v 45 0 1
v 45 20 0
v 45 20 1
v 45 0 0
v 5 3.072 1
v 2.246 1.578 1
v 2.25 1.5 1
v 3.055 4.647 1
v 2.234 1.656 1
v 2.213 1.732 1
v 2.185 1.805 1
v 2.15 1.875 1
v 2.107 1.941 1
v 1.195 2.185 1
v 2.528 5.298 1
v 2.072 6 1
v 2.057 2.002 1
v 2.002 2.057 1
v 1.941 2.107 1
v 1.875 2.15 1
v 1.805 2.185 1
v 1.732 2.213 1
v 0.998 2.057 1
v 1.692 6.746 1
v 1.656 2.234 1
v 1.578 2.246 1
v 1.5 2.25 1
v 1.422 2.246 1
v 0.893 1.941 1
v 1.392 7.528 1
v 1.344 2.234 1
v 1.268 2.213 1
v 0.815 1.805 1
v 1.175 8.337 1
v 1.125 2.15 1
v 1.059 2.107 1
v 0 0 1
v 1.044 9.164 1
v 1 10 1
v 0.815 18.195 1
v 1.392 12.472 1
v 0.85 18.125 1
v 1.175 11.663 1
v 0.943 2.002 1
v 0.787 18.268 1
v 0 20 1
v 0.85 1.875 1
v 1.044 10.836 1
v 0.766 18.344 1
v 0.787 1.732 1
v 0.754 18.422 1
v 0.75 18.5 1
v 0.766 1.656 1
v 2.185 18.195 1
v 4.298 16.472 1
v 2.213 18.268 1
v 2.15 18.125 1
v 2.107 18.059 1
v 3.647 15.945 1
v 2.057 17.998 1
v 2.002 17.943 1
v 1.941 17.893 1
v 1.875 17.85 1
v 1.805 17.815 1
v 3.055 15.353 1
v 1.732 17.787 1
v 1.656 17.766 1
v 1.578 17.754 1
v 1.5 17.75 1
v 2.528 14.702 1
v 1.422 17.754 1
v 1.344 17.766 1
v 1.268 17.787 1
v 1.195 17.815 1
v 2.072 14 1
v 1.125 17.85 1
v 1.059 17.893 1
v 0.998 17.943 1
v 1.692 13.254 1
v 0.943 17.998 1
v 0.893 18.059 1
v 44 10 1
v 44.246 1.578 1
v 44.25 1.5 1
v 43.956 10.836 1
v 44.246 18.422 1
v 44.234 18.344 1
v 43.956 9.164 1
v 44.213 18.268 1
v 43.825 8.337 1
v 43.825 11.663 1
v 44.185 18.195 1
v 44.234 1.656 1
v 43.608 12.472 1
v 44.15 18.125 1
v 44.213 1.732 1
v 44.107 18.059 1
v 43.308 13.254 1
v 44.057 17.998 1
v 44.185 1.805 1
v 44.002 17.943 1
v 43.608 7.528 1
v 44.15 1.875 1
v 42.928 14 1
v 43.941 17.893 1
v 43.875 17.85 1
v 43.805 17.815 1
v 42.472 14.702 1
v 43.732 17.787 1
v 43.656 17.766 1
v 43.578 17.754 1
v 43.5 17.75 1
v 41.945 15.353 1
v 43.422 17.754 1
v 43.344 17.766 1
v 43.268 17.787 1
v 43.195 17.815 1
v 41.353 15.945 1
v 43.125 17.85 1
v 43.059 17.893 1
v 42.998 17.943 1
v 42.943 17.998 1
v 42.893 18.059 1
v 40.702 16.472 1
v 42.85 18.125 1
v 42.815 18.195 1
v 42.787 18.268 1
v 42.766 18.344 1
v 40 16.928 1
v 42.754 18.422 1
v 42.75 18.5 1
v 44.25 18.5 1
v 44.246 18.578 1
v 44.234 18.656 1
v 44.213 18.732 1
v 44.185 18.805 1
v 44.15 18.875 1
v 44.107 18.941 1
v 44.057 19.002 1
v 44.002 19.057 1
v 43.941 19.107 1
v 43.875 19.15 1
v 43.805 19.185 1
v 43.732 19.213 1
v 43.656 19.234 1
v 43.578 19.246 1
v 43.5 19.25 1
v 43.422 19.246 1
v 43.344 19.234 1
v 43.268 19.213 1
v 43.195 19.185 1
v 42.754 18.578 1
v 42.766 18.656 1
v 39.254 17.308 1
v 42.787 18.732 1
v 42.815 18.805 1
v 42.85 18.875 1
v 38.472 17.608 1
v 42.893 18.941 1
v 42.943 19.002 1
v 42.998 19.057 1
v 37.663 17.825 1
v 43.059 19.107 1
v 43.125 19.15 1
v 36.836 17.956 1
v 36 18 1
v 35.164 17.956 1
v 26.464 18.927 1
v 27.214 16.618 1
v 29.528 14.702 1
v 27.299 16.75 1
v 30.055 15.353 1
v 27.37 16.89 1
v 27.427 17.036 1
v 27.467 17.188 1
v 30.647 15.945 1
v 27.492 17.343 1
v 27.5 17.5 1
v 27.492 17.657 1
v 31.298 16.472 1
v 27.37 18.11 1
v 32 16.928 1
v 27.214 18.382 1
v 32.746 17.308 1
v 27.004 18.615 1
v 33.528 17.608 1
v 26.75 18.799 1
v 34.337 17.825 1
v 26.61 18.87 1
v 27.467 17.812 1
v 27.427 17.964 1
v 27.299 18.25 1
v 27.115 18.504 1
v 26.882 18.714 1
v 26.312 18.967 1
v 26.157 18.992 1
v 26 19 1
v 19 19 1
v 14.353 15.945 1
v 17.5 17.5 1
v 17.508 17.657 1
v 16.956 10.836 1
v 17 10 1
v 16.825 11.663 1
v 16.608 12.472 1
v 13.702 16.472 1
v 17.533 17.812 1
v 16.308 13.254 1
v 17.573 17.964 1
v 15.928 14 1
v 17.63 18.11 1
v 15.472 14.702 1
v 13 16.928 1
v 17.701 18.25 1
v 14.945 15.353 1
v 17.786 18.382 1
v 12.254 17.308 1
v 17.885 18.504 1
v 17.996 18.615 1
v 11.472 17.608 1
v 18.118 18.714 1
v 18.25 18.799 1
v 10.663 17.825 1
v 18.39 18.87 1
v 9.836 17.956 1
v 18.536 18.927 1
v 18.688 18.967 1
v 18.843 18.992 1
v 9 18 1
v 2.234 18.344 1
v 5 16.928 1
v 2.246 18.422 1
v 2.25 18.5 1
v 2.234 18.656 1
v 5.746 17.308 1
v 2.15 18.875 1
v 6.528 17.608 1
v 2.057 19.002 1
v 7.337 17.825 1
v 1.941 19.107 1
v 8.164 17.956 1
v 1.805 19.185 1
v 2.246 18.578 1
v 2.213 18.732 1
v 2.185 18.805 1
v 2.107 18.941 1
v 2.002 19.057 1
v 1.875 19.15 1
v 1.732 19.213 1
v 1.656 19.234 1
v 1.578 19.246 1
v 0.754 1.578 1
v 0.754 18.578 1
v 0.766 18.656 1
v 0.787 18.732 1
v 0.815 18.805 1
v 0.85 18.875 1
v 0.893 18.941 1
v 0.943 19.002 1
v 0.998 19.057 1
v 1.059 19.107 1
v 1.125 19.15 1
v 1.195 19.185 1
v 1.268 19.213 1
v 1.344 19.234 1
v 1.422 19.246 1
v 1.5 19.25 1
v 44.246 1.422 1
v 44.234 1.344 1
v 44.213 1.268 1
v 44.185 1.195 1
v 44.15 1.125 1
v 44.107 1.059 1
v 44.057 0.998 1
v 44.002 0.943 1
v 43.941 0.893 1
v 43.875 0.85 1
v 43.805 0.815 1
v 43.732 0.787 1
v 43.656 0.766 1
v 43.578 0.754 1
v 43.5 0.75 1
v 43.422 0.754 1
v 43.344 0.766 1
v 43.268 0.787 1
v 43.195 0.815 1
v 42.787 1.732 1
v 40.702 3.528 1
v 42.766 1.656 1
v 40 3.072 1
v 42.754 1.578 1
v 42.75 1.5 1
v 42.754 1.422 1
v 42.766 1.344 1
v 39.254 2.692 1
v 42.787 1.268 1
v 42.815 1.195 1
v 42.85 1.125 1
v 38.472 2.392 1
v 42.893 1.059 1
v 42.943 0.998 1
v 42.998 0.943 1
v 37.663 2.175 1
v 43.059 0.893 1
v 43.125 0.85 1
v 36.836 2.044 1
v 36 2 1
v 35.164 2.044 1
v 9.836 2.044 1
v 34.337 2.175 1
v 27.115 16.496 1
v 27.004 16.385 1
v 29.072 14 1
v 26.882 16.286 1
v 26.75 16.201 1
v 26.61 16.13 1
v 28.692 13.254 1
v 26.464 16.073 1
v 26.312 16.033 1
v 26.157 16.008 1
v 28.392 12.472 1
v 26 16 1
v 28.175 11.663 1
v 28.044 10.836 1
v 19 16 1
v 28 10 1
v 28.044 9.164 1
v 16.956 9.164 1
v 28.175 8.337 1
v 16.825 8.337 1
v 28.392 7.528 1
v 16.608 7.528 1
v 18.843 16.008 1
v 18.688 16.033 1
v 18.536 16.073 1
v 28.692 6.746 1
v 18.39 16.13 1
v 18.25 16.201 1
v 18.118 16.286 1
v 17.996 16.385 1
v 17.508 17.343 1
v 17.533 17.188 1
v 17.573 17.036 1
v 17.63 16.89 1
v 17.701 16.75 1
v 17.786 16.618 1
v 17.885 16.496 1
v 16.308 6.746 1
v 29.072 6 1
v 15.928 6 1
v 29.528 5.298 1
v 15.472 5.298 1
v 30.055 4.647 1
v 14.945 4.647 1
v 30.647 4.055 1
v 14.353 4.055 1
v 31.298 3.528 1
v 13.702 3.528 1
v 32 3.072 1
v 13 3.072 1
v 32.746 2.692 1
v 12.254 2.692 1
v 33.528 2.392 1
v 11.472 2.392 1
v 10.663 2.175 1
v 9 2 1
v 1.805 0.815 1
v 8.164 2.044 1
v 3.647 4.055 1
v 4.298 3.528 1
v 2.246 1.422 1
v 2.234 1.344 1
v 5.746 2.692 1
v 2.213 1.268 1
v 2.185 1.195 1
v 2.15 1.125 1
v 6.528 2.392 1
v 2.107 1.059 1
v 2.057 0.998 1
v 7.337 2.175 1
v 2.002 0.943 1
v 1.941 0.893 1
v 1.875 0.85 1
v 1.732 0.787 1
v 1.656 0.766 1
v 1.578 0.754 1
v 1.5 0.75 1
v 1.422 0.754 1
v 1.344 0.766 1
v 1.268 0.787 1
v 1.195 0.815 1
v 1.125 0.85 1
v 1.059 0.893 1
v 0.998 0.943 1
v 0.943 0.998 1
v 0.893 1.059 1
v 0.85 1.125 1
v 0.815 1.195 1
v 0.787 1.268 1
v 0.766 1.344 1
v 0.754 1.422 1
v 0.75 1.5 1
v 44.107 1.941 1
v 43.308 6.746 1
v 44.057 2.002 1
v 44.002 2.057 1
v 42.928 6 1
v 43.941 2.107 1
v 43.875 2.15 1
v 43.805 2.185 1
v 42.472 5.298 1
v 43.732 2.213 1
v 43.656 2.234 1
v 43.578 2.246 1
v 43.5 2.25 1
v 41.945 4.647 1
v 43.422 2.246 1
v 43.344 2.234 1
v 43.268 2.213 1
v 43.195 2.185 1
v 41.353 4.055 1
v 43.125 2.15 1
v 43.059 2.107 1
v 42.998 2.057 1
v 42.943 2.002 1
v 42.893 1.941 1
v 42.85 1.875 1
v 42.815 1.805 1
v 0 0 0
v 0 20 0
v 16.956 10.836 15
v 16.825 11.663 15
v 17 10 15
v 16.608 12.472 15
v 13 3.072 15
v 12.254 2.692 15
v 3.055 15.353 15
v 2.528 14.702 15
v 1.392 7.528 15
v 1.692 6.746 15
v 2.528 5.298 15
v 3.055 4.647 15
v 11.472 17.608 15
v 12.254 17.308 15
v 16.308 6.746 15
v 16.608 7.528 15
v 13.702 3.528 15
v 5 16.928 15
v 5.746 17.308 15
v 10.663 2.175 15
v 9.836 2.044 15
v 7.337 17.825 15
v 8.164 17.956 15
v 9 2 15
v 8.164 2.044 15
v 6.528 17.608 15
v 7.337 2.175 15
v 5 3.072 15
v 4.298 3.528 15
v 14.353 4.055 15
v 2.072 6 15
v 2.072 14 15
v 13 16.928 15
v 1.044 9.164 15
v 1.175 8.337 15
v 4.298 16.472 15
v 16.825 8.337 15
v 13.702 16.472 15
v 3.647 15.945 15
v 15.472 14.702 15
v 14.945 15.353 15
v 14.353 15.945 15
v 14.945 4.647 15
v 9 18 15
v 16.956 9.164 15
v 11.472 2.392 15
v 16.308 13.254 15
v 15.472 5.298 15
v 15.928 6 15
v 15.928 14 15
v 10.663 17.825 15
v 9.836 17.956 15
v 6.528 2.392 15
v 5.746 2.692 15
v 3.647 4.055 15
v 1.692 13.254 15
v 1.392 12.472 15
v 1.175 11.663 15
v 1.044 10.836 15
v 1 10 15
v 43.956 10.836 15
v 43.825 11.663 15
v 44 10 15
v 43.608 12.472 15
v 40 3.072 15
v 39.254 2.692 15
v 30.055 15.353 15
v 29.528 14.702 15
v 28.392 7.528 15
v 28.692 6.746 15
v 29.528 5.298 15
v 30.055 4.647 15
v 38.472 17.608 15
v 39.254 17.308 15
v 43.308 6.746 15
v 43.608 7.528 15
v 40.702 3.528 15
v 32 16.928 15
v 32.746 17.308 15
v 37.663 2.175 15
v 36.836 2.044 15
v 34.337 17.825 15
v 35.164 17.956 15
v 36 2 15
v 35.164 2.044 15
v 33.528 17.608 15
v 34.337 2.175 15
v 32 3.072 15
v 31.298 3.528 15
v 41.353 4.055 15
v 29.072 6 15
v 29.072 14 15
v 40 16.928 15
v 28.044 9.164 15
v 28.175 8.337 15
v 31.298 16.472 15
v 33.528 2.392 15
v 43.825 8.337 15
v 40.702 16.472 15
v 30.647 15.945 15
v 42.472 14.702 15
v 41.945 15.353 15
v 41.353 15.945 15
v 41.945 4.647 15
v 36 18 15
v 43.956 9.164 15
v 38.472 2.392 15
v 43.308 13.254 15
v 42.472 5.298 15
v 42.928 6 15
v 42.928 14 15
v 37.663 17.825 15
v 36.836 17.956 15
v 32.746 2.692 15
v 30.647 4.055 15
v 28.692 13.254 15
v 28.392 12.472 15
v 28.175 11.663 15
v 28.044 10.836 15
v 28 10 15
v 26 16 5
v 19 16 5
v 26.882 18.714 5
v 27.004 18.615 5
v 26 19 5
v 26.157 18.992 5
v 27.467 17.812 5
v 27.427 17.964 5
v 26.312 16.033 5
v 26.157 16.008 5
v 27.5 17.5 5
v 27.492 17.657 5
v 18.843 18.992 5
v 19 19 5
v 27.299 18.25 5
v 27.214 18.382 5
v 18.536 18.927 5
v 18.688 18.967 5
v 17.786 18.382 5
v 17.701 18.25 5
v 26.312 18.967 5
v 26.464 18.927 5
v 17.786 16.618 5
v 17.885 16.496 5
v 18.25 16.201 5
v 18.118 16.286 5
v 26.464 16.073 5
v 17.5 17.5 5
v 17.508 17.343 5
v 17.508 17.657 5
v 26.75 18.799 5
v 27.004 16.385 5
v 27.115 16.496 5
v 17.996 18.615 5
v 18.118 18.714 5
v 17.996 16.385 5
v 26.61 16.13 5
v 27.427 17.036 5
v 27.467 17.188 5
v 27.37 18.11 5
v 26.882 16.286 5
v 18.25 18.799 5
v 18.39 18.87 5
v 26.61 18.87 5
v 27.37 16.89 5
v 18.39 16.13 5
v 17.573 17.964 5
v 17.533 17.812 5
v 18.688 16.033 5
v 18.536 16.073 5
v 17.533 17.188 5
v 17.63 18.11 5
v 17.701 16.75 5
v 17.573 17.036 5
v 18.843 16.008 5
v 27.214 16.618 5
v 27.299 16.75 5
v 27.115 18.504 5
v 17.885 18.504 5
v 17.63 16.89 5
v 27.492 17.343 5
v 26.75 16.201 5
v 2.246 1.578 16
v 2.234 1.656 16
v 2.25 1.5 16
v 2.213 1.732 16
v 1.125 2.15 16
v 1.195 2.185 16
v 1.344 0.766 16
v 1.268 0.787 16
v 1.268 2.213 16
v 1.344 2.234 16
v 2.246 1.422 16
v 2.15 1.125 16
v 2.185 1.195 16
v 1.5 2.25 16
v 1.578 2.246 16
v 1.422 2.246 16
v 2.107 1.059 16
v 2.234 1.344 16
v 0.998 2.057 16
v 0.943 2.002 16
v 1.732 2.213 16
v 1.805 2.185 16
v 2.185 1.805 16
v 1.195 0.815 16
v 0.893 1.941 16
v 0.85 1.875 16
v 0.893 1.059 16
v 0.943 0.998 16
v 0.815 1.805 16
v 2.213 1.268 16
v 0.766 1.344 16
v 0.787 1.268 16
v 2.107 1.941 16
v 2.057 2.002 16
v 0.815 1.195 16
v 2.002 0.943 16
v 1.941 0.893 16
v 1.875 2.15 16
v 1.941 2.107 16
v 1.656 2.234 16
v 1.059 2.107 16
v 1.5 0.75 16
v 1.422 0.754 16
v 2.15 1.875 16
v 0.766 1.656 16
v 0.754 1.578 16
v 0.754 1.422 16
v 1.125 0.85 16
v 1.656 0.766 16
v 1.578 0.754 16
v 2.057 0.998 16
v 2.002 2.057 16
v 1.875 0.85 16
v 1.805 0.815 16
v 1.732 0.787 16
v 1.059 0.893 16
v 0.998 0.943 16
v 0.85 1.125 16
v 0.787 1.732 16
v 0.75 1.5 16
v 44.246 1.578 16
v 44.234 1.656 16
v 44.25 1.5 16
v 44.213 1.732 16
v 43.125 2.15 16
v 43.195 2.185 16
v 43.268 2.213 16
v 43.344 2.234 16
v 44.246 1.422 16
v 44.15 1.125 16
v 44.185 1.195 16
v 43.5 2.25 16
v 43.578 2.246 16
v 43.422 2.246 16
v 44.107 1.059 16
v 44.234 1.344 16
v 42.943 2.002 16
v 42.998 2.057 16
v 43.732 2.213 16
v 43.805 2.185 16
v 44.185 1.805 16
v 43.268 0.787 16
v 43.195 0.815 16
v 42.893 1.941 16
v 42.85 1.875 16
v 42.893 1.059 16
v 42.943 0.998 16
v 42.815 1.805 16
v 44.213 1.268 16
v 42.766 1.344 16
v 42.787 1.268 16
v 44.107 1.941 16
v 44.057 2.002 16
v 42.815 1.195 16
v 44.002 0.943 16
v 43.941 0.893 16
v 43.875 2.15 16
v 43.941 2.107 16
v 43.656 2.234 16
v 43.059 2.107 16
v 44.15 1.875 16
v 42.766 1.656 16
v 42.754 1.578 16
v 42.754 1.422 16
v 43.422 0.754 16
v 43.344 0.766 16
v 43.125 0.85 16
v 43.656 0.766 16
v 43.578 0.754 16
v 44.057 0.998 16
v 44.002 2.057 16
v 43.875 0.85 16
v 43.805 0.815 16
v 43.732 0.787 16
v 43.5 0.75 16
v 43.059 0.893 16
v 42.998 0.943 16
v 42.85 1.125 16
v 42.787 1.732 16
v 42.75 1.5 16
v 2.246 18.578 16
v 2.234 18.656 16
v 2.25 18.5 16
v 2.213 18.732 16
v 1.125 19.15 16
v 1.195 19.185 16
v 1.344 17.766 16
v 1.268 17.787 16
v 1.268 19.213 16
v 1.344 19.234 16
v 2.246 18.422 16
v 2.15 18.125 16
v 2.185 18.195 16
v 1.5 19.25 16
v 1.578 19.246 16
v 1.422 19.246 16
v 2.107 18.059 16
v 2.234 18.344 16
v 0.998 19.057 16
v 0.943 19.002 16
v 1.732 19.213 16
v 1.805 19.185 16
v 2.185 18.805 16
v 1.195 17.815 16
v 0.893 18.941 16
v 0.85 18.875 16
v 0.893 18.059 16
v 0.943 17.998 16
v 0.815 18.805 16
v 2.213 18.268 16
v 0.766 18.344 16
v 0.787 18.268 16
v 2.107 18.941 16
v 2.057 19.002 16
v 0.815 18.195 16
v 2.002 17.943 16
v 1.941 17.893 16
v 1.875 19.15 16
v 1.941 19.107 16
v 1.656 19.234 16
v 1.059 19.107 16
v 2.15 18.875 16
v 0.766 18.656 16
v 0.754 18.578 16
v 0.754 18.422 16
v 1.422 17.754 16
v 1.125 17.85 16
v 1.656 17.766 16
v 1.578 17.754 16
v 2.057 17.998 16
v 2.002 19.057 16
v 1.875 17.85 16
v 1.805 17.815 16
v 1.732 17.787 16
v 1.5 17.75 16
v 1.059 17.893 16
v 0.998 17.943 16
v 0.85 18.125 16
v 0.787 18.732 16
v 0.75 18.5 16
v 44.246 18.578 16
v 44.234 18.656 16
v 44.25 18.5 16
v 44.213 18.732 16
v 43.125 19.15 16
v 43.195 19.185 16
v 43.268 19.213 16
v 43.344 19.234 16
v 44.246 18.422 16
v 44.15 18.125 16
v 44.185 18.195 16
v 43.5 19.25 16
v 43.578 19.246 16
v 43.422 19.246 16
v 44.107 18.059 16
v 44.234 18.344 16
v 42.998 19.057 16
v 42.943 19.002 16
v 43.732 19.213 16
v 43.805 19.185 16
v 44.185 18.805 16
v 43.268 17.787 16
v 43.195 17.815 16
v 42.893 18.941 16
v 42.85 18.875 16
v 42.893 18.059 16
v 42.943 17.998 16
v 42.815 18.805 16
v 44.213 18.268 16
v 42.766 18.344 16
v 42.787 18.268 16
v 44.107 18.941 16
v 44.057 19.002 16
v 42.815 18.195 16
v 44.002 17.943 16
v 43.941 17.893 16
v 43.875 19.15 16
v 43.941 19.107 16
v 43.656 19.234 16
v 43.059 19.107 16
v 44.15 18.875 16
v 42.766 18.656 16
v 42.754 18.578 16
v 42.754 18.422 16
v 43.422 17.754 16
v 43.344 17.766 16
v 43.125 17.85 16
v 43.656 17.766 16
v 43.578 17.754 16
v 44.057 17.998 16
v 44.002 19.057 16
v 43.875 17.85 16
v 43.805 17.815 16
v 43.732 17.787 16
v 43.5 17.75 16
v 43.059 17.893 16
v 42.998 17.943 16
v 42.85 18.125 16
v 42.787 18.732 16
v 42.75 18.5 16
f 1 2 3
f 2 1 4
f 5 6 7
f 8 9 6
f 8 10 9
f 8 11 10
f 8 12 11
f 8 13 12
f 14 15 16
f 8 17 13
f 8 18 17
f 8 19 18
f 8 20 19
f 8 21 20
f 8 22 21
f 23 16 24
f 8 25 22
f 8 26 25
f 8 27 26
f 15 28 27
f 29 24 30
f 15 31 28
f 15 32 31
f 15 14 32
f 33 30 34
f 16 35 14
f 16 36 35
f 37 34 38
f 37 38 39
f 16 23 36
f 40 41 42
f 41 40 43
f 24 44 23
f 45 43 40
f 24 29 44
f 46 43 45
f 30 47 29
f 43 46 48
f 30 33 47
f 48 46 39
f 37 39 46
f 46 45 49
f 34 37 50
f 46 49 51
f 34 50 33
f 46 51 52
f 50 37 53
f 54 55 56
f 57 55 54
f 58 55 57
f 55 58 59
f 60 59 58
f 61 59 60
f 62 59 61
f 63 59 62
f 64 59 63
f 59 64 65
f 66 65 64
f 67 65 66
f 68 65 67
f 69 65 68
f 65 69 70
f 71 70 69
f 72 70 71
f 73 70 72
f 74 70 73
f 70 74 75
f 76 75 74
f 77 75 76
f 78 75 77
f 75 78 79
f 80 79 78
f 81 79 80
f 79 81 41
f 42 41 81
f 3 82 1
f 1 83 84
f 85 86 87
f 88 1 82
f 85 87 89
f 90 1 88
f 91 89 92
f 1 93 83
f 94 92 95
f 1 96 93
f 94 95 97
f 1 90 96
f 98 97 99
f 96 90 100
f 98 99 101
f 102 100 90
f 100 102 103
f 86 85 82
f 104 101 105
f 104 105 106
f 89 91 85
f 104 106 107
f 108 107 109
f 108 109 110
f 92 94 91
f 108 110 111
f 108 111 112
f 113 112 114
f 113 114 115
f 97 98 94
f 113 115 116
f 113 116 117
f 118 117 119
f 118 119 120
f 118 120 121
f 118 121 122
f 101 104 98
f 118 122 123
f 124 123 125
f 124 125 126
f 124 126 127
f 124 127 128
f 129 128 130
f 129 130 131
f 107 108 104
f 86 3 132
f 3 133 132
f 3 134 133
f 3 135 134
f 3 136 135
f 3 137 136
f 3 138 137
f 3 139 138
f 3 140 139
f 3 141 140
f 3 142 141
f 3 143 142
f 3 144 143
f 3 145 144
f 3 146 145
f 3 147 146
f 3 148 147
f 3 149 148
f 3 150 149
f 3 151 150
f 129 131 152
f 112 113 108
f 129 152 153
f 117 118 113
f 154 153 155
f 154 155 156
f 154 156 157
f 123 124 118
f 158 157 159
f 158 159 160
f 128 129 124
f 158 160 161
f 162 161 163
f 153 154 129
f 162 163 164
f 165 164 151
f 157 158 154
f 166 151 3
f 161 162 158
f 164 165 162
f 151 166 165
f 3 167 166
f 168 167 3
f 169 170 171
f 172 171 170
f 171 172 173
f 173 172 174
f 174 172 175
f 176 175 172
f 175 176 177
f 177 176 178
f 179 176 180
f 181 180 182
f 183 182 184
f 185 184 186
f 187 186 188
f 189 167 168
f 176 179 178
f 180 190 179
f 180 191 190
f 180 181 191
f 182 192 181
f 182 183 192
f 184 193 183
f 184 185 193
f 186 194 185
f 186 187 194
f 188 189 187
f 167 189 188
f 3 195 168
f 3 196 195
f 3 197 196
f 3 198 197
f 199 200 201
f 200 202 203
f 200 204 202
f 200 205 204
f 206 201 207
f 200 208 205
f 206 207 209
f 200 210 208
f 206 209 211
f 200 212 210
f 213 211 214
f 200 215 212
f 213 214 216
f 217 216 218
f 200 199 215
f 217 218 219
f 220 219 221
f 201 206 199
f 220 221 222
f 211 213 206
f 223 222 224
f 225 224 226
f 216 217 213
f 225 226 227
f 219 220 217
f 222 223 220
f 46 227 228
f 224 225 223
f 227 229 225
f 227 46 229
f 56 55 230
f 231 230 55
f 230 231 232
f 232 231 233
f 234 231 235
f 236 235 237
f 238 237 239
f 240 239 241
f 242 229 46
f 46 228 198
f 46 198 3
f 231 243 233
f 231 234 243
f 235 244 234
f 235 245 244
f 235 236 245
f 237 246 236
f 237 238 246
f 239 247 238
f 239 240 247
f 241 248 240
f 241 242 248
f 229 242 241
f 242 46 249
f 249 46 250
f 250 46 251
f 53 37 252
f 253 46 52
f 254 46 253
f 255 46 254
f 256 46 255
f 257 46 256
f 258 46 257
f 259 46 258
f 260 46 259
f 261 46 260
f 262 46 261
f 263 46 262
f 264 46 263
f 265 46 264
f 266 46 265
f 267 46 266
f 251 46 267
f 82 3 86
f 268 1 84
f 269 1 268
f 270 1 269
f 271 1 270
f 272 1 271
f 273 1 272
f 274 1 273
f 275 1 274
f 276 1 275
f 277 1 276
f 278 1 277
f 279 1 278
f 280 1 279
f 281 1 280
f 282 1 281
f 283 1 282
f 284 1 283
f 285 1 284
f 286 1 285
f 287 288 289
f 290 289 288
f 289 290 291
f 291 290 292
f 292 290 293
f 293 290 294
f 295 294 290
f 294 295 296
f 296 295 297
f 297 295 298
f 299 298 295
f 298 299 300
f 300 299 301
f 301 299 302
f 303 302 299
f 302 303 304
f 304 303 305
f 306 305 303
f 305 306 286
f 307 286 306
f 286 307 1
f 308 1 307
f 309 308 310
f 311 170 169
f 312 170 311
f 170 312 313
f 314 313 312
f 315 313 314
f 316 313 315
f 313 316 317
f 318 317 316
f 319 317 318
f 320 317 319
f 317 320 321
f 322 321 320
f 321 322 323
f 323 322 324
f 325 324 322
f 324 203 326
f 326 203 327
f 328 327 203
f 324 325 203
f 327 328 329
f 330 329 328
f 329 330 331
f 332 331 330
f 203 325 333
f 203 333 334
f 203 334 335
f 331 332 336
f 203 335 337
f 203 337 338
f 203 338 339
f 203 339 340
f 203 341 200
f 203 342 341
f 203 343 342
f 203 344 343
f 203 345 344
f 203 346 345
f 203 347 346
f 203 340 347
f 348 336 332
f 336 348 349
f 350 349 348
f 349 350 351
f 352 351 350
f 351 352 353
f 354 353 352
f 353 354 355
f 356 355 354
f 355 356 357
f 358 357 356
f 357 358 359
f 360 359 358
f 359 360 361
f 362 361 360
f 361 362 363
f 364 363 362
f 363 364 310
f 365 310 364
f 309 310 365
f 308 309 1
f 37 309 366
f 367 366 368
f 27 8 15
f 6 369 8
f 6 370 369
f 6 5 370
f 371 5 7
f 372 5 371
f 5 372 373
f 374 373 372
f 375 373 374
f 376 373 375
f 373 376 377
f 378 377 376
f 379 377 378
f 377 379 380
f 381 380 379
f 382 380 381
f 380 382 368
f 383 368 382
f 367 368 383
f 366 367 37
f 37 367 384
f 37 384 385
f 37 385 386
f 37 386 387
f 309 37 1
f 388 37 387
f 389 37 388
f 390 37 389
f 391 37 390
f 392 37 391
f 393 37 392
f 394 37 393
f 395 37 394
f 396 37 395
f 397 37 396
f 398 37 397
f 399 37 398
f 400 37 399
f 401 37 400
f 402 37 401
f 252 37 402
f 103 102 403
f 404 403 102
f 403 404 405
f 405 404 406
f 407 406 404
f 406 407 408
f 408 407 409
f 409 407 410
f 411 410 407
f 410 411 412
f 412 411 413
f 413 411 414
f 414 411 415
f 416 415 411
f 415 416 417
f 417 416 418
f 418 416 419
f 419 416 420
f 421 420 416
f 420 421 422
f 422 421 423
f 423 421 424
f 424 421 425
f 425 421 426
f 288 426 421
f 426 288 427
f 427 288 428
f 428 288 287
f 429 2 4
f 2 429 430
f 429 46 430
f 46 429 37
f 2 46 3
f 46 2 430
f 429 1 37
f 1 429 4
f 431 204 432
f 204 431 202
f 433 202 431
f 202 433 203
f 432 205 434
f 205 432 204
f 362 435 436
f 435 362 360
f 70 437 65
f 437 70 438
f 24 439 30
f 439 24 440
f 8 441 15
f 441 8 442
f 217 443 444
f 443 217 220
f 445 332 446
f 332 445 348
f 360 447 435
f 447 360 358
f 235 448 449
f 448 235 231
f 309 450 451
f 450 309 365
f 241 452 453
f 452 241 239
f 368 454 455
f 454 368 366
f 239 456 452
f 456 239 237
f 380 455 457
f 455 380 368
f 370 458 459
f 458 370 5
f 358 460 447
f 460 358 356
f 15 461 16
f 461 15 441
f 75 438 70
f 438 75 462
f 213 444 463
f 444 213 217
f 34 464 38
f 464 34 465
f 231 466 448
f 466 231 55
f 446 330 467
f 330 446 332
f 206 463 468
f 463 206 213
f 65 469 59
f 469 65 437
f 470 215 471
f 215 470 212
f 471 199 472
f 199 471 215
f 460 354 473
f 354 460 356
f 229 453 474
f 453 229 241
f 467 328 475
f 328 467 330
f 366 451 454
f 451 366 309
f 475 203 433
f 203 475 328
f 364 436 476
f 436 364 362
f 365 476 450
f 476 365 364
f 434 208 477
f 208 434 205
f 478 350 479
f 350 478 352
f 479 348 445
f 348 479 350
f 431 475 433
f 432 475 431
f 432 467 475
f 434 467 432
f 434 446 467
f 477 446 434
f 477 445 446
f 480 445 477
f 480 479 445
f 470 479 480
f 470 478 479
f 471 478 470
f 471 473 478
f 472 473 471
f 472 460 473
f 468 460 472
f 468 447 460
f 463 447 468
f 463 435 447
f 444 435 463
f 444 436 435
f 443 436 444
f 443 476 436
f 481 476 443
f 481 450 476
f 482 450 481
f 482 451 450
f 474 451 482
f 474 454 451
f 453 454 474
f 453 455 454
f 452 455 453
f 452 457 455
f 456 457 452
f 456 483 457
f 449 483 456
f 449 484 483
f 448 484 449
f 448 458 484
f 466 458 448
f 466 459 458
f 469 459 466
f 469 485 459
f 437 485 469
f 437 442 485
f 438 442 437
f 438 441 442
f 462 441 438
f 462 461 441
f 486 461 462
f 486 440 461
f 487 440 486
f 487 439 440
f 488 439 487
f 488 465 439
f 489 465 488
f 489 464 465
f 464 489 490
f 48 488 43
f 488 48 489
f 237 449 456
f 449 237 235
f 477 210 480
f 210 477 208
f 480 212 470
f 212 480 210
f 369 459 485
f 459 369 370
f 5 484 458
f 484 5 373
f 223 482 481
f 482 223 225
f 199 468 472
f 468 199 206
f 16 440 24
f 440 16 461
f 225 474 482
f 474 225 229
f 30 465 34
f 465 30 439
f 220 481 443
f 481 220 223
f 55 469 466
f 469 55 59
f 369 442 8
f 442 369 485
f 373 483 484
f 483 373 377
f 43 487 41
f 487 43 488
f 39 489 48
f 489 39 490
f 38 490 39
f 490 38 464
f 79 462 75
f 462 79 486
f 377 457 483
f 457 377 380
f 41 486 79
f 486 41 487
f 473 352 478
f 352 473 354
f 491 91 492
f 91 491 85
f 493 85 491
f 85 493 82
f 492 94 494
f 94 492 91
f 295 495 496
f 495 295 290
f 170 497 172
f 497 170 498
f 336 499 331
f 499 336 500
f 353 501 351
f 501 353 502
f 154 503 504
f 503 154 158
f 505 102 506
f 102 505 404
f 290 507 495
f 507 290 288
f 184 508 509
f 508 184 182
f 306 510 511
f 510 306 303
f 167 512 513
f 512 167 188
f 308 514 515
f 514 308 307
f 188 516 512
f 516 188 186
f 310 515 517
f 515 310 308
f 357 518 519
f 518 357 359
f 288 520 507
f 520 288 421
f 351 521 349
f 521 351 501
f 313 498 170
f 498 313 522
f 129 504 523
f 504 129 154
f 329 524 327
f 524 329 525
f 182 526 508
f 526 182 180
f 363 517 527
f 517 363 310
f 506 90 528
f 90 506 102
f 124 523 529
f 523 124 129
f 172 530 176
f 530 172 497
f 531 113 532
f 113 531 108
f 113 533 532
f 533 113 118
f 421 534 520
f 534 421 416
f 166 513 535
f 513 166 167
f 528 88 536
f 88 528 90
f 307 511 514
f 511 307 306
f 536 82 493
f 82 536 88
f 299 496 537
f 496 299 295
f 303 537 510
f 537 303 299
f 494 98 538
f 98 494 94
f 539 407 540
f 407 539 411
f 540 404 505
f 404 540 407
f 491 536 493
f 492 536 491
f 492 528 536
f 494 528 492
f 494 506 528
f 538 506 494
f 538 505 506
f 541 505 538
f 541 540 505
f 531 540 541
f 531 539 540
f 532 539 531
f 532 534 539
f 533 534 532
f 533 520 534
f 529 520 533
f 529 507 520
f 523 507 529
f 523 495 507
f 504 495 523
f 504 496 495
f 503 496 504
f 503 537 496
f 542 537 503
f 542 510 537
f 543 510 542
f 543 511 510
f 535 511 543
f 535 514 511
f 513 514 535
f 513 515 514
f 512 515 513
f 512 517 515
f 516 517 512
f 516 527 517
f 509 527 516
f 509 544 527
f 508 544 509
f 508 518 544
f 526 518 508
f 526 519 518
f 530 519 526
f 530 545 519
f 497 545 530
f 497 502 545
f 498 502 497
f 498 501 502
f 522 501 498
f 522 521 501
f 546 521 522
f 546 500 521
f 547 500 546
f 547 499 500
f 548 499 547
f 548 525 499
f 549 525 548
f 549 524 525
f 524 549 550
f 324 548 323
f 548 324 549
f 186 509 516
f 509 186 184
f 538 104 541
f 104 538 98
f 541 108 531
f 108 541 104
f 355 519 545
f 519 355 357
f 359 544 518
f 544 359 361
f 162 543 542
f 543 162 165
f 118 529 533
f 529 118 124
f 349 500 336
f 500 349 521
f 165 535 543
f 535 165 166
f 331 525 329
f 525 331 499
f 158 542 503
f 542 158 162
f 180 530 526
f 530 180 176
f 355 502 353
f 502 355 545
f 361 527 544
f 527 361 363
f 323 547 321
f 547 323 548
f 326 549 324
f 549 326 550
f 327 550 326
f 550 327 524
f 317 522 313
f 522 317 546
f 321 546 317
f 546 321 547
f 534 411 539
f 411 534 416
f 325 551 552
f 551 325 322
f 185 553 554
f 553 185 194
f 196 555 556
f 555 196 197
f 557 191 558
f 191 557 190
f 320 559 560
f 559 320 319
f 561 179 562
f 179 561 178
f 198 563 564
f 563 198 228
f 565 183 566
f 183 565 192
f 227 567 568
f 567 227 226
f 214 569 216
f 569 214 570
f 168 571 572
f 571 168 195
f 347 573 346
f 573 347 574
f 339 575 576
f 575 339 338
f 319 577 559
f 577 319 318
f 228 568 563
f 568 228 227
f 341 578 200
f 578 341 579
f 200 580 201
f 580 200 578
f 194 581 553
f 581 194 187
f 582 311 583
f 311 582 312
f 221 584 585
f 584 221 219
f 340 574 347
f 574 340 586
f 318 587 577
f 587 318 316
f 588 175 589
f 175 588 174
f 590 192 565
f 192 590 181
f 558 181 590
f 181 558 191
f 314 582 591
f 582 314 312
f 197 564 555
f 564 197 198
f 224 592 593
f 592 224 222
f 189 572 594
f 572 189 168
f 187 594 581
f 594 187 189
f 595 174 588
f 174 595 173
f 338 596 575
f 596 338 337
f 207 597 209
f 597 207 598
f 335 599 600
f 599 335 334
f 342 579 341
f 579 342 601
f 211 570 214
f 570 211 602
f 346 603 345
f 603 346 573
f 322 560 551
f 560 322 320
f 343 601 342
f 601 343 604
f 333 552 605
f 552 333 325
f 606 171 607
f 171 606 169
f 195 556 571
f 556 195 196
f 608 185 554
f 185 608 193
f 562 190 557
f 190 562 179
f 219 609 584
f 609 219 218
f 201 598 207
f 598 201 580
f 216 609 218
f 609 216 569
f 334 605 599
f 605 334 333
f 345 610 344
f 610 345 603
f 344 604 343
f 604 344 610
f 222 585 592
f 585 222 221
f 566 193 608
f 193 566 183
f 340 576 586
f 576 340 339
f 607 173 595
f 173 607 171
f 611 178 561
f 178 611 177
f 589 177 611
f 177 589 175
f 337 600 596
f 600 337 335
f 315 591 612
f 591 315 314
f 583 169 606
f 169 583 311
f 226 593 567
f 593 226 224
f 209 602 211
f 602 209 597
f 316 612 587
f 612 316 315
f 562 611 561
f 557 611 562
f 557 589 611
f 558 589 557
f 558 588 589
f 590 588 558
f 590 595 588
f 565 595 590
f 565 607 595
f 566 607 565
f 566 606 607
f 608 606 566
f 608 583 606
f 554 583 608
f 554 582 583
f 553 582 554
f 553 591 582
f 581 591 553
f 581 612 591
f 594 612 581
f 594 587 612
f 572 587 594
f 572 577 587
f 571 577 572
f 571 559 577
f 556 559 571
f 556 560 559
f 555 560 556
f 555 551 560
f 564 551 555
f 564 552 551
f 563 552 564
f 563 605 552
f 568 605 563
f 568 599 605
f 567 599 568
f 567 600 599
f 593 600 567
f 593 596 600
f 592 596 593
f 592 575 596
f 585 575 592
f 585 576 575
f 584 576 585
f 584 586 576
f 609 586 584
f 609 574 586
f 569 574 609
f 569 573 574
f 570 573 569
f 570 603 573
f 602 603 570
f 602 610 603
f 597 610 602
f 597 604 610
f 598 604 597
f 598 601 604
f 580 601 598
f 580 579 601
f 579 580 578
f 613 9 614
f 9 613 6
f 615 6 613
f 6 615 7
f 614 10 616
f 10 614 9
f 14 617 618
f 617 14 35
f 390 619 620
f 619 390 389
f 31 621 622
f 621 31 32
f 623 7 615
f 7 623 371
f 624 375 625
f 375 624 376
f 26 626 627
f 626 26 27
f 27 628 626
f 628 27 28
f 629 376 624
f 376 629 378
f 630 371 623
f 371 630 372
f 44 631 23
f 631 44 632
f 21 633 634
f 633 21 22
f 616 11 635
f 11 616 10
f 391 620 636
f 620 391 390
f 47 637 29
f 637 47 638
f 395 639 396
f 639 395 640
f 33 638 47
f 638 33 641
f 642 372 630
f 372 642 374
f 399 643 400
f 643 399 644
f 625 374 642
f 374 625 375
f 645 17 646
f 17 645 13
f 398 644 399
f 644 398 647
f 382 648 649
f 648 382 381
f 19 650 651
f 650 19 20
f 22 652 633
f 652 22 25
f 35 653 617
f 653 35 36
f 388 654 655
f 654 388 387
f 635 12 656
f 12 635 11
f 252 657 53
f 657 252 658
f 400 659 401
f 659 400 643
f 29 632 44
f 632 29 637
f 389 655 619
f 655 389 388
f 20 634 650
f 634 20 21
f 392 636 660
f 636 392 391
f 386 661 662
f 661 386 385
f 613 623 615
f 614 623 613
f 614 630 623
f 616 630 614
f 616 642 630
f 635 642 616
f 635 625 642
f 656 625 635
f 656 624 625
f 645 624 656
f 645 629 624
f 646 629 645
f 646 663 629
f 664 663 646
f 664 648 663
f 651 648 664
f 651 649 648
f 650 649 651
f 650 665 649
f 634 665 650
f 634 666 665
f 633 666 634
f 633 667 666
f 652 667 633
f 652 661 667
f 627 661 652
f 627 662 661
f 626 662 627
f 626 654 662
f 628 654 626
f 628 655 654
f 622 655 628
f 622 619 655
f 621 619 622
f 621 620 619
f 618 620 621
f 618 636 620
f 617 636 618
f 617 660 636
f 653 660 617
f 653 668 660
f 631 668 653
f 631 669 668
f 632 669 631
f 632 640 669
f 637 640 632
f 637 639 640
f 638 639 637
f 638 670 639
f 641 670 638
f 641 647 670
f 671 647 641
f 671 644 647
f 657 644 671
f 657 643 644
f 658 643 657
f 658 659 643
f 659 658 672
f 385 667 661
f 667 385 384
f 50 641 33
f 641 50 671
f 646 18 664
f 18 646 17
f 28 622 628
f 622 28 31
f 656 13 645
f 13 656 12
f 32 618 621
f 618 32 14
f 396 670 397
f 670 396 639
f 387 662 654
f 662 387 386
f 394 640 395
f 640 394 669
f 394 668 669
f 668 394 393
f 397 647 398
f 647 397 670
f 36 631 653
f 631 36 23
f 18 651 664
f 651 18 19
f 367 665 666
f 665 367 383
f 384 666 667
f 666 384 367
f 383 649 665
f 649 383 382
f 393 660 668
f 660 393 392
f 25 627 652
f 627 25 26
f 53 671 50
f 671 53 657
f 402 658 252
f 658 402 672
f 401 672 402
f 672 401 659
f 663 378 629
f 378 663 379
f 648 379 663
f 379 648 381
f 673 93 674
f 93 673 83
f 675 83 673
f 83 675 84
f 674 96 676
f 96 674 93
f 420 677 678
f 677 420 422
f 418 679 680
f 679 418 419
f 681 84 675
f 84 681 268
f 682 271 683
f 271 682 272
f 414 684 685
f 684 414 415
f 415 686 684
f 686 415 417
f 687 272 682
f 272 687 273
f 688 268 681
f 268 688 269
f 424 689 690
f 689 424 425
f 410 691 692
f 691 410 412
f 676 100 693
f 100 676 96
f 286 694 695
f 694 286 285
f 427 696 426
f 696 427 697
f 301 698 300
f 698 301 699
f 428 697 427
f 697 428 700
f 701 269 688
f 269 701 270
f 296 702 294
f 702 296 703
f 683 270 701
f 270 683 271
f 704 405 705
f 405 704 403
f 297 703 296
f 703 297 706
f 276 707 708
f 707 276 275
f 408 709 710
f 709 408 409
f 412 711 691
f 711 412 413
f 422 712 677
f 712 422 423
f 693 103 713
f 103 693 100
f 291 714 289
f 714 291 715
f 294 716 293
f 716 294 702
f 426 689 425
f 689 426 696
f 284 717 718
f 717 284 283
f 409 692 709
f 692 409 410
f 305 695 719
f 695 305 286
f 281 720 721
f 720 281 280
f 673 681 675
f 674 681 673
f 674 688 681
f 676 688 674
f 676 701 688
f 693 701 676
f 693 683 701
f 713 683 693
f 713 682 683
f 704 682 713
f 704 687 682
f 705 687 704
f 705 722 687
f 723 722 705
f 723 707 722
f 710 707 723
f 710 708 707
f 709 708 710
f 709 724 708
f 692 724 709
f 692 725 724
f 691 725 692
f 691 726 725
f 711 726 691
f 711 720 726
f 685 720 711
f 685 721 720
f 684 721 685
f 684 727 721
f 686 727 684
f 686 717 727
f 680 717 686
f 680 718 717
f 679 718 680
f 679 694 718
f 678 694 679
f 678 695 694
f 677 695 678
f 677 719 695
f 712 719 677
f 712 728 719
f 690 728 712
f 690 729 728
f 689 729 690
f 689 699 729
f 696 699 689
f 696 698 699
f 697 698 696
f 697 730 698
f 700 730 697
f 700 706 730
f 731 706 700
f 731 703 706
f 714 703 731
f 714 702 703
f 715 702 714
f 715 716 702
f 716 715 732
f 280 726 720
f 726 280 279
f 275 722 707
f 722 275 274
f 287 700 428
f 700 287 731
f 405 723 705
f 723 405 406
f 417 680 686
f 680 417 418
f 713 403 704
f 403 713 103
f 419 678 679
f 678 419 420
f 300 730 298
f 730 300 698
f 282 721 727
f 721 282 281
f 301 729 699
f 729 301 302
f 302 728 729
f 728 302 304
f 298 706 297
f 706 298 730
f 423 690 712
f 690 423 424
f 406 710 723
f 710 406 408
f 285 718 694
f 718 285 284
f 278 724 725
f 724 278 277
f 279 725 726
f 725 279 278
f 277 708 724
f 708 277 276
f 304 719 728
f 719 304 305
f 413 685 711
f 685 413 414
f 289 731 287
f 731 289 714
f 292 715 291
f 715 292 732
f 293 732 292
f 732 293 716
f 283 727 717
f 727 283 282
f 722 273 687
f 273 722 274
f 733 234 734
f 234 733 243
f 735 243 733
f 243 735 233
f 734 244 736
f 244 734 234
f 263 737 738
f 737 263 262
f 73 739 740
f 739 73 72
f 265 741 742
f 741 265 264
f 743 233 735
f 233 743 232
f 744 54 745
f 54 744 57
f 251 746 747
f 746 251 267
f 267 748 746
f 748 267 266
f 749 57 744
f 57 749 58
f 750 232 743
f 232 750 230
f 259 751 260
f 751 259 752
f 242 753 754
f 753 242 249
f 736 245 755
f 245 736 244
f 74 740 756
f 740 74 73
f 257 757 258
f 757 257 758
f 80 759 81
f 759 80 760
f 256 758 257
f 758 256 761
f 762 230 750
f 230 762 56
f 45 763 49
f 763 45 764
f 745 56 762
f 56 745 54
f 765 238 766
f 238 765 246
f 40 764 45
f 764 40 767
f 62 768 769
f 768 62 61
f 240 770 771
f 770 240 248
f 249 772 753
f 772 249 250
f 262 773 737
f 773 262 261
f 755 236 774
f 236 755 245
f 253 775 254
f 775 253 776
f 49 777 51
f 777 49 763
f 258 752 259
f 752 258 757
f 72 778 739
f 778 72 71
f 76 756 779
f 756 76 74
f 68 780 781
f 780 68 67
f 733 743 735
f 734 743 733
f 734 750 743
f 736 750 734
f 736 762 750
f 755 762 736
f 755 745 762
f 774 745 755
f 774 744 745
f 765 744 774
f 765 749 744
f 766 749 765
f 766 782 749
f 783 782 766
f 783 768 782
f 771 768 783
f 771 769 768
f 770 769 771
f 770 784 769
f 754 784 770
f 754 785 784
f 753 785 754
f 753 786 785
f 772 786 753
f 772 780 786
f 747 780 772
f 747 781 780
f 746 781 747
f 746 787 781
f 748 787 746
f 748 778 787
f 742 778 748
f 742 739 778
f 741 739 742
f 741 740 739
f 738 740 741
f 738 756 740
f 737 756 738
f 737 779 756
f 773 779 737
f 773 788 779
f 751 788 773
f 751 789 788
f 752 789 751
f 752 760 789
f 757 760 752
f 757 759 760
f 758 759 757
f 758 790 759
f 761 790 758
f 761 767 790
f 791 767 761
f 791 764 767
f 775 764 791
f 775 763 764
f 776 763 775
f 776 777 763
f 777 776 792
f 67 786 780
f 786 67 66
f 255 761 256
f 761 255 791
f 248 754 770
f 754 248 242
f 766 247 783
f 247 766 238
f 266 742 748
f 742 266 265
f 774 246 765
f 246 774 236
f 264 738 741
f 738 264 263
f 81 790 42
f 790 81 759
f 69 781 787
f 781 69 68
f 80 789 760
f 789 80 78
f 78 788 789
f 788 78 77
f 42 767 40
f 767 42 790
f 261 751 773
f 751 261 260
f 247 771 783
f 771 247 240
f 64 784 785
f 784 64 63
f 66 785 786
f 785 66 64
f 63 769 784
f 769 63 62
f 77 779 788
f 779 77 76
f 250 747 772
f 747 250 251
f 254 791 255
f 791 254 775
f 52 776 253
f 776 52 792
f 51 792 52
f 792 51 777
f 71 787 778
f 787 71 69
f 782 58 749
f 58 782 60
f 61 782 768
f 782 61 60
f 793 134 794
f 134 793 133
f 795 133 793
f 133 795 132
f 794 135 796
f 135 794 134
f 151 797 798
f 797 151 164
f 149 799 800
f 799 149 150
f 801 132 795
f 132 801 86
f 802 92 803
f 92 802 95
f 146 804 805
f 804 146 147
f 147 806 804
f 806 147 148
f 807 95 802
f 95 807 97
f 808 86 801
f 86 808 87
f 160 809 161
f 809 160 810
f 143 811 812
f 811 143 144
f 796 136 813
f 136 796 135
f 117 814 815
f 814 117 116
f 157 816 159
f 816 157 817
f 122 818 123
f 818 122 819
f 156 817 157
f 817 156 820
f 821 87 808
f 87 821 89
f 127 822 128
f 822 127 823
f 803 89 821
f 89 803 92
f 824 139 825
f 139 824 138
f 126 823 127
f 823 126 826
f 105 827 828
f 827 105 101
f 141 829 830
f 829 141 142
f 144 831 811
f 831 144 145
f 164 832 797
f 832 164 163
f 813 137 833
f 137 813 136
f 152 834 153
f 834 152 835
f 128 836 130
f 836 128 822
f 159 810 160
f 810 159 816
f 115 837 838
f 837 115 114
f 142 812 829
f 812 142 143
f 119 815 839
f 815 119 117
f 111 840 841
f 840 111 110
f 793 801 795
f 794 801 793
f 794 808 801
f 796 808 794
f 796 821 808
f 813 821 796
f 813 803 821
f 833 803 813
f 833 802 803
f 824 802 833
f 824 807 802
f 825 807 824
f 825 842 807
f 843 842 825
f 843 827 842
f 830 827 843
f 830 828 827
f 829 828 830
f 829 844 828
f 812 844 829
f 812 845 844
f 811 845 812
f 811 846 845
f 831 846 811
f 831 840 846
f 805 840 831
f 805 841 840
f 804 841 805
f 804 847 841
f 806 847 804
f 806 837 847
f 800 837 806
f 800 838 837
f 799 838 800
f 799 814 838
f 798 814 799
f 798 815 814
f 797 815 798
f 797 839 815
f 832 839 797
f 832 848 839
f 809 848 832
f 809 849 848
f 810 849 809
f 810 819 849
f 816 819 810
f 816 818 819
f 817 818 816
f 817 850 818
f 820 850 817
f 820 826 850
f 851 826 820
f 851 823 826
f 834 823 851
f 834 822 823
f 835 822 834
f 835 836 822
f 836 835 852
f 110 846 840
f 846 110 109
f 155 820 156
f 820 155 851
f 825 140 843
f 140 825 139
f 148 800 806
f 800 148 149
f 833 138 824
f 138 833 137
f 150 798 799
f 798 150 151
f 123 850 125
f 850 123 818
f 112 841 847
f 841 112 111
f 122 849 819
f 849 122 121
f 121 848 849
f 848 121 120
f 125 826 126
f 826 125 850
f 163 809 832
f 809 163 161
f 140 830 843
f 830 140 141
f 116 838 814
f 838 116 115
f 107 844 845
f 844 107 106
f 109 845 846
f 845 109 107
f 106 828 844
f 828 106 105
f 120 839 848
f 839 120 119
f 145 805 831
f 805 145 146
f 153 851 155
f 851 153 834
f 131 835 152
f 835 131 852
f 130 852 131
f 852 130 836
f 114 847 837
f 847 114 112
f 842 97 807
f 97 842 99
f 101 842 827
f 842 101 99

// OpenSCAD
$fn=60;
union(){
    union(){
        cube([45,20,1]);
        translate([9,10,0])cylinder(d=16,h=15);
        translate([45-9,10,0])cylinder(d=16,h=15);
        translate([45/2-7/2, 20-1-3/2,0])hull(){
            cylinder(d=3, h=5);
            translate([7,0,0])cylinder(d=3, h=5);
            }
    }
    translate([1.5,1.5,0])cylinder(d=1.5,h=16);
    translate([45-1.5,1.5,0])cylinder(d=1.5,h=16);
    translate([1.5,20-1.5,0])cylinder(d=1.5,h=16);
    translate([45-1.5,20-1.5,0])cylinder(d=1.5,h=16);
}
